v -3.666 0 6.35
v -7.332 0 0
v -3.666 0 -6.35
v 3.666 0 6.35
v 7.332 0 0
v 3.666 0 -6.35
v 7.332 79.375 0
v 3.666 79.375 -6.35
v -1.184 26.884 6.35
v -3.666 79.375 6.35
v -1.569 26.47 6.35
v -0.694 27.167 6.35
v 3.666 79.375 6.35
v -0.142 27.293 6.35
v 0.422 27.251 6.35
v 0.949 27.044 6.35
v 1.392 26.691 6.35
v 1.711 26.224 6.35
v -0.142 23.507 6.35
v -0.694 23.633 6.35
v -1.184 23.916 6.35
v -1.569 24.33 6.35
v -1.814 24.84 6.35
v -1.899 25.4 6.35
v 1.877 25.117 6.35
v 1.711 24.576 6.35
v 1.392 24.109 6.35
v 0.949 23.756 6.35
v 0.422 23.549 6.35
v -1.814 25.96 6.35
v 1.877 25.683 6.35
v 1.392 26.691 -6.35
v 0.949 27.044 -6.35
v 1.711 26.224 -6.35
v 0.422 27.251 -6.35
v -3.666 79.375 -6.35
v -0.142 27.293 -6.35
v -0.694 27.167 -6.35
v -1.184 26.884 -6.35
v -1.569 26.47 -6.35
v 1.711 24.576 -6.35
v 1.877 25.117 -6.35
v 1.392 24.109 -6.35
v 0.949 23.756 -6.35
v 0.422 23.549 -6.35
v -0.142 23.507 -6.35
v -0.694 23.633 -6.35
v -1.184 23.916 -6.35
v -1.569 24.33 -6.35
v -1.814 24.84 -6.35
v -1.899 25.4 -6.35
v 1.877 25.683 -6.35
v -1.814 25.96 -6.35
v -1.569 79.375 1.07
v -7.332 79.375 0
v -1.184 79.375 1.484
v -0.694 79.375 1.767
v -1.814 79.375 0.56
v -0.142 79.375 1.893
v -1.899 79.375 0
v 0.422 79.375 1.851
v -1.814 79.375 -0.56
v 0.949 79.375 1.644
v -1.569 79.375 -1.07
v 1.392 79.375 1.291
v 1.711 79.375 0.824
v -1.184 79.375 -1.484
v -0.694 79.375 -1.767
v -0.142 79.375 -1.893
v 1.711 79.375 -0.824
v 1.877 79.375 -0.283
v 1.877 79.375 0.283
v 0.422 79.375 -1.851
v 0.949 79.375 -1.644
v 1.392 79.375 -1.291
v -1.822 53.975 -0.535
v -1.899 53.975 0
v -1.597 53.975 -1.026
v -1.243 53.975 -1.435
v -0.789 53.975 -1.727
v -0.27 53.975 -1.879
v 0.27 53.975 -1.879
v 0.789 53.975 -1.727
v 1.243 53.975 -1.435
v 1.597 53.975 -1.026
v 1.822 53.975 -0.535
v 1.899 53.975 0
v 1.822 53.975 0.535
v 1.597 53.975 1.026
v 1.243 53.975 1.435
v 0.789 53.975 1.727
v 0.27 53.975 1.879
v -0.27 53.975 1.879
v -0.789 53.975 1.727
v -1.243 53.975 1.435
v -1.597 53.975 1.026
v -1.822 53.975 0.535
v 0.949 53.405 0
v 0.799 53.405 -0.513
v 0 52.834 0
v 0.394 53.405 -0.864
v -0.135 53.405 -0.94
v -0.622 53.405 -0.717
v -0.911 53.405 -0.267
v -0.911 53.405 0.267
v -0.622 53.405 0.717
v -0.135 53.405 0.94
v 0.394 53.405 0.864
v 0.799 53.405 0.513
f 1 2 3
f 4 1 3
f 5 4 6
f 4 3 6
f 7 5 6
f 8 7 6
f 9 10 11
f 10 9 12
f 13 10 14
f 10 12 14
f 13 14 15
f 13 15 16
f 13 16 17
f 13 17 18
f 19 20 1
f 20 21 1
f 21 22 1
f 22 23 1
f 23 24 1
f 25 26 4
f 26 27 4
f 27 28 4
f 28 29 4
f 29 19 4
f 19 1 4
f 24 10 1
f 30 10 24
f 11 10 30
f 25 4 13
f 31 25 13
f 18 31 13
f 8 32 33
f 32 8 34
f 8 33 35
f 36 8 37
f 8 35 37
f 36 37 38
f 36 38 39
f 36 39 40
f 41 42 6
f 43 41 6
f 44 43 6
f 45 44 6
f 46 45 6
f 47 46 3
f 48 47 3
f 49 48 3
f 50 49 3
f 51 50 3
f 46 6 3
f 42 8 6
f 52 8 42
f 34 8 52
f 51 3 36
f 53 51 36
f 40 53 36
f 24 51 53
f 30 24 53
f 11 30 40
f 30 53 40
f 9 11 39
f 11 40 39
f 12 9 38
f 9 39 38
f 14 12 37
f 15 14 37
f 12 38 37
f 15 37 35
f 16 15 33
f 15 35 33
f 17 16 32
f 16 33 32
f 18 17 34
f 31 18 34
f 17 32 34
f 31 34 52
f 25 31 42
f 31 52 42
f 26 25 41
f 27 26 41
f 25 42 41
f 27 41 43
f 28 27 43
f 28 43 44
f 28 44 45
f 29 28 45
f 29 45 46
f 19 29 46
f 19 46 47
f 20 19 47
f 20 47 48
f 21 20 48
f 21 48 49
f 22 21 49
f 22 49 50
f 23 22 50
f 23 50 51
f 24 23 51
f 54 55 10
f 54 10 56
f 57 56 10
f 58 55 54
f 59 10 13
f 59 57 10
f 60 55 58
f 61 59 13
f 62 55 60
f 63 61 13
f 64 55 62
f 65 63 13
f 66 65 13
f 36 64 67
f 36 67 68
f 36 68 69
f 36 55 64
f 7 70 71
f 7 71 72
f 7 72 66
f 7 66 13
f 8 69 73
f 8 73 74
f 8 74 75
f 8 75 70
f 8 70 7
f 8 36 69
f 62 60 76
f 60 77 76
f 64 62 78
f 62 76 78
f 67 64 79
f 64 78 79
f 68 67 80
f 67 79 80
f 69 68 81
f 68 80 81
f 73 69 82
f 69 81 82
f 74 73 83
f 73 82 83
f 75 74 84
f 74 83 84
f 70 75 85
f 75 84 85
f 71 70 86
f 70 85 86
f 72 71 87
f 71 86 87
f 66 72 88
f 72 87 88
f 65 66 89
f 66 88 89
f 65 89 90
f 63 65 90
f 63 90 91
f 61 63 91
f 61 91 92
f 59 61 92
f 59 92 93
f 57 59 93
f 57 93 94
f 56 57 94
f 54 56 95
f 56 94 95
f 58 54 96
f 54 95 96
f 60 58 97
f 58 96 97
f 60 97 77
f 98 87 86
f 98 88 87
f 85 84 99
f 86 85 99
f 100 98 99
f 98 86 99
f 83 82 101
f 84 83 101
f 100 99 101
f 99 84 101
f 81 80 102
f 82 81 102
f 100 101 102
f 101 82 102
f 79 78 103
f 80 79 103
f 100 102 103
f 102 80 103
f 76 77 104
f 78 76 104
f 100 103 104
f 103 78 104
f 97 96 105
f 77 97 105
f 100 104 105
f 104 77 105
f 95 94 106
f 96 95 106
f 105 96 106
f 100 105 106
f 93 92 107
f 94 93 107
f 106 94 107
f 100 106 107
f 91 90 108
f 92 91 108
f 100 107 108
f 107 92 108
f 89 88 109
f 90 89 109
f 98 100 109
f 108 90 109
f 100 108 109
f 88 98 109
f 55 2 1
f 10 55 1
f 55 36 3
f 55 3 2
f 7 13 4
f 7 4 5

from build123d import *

# Parameters (mm, degrees)
BOSS_EXTRUDE1_DEPTH            = 79.375
TAP_DRILL_FOR_10_24_TAP1_D     = 3.7973
TAP_DRILL_FOR_10_24_TAP1_DEPTH = 25.4
TAP_DRILL_FOR_10_24_TAP1_TIP   = 1.140824014
TAP_DRILL_FOR_10_24_TAP2_D     = 3.7973
TAP_DRILL_FOR_10_24_TAP2_DEPTH = 25.4
TAP_DRILL_FOR_10_24_TAP2_TIP   = 1.140824014


with BuildPart() as part:
    # Sketch1 → Boss-Extrude1 (new body)
    with BuildSketch(Plane(origin=(0, 0, 0), x_dir=(1, 0, 0), z_dir=(0, 1, 0))):
        Polygon((7.332348419, 0), (3.666174209, 6.35), (-3.666174209, 6.35), (-7.332348419, 0), (-3.666174209, -6.35), (3.666174209, -6.35), align=None)
    extrude(amount=BOSS_EXTRUDE1_DEPTH)

    # Tap Drill for #10-24 Tap1
    with Locations(Plane(origin=(0, 79.375, 0), x_dir=(1, 0, 0), z_dir=(0, 1, 0))):
        with Locations((0, 0)):
            Hole(TAP_DRILL_FOR_10_24_TAP1_D / 2, depth=TAP_DRILL_FOR_10_24_TAP1_DEPTH)
            with Locations((0, 0, -(TAP_DRILL_FOR_10_24_TAP1_DEPTH + TAP_DRILL_FOR_10_24_TAP1_TIP / 2))):  # 118° drill point
                Cone(0, TAP_DRILL_FOR_10_24_TAP1_D / 2, TAP_DRILL_FOR_10_24_TAP1_TIP, mode=Mode.SUBTRACT)

    # Tap Drill for #10-24 Tap2
    with Locations(Plane.XY.offset(6.35)):
        with Locations((0, 25.4)):
            Hole(TAP_DRILL_FOR_10_24_TAP2_D / 2, depth=TAP_DRILL_FOR_10_24_TAP2_DEPTH)
            with Locations((0, 0, -(TAP_DRILL_FOR_10_24_TAP2_DEPTH + TAP_DRILL_FOR_10_24_TAP2_TIP / 2))):  # 118° drill point
                Cone(0, TAP_DRILL_FOR_10_24_TAP2_D / 2, TAP_DRILL_FOR_10_24_TAP2_TIP, mode=Mode.SUBTRACT)


solid = part.part
